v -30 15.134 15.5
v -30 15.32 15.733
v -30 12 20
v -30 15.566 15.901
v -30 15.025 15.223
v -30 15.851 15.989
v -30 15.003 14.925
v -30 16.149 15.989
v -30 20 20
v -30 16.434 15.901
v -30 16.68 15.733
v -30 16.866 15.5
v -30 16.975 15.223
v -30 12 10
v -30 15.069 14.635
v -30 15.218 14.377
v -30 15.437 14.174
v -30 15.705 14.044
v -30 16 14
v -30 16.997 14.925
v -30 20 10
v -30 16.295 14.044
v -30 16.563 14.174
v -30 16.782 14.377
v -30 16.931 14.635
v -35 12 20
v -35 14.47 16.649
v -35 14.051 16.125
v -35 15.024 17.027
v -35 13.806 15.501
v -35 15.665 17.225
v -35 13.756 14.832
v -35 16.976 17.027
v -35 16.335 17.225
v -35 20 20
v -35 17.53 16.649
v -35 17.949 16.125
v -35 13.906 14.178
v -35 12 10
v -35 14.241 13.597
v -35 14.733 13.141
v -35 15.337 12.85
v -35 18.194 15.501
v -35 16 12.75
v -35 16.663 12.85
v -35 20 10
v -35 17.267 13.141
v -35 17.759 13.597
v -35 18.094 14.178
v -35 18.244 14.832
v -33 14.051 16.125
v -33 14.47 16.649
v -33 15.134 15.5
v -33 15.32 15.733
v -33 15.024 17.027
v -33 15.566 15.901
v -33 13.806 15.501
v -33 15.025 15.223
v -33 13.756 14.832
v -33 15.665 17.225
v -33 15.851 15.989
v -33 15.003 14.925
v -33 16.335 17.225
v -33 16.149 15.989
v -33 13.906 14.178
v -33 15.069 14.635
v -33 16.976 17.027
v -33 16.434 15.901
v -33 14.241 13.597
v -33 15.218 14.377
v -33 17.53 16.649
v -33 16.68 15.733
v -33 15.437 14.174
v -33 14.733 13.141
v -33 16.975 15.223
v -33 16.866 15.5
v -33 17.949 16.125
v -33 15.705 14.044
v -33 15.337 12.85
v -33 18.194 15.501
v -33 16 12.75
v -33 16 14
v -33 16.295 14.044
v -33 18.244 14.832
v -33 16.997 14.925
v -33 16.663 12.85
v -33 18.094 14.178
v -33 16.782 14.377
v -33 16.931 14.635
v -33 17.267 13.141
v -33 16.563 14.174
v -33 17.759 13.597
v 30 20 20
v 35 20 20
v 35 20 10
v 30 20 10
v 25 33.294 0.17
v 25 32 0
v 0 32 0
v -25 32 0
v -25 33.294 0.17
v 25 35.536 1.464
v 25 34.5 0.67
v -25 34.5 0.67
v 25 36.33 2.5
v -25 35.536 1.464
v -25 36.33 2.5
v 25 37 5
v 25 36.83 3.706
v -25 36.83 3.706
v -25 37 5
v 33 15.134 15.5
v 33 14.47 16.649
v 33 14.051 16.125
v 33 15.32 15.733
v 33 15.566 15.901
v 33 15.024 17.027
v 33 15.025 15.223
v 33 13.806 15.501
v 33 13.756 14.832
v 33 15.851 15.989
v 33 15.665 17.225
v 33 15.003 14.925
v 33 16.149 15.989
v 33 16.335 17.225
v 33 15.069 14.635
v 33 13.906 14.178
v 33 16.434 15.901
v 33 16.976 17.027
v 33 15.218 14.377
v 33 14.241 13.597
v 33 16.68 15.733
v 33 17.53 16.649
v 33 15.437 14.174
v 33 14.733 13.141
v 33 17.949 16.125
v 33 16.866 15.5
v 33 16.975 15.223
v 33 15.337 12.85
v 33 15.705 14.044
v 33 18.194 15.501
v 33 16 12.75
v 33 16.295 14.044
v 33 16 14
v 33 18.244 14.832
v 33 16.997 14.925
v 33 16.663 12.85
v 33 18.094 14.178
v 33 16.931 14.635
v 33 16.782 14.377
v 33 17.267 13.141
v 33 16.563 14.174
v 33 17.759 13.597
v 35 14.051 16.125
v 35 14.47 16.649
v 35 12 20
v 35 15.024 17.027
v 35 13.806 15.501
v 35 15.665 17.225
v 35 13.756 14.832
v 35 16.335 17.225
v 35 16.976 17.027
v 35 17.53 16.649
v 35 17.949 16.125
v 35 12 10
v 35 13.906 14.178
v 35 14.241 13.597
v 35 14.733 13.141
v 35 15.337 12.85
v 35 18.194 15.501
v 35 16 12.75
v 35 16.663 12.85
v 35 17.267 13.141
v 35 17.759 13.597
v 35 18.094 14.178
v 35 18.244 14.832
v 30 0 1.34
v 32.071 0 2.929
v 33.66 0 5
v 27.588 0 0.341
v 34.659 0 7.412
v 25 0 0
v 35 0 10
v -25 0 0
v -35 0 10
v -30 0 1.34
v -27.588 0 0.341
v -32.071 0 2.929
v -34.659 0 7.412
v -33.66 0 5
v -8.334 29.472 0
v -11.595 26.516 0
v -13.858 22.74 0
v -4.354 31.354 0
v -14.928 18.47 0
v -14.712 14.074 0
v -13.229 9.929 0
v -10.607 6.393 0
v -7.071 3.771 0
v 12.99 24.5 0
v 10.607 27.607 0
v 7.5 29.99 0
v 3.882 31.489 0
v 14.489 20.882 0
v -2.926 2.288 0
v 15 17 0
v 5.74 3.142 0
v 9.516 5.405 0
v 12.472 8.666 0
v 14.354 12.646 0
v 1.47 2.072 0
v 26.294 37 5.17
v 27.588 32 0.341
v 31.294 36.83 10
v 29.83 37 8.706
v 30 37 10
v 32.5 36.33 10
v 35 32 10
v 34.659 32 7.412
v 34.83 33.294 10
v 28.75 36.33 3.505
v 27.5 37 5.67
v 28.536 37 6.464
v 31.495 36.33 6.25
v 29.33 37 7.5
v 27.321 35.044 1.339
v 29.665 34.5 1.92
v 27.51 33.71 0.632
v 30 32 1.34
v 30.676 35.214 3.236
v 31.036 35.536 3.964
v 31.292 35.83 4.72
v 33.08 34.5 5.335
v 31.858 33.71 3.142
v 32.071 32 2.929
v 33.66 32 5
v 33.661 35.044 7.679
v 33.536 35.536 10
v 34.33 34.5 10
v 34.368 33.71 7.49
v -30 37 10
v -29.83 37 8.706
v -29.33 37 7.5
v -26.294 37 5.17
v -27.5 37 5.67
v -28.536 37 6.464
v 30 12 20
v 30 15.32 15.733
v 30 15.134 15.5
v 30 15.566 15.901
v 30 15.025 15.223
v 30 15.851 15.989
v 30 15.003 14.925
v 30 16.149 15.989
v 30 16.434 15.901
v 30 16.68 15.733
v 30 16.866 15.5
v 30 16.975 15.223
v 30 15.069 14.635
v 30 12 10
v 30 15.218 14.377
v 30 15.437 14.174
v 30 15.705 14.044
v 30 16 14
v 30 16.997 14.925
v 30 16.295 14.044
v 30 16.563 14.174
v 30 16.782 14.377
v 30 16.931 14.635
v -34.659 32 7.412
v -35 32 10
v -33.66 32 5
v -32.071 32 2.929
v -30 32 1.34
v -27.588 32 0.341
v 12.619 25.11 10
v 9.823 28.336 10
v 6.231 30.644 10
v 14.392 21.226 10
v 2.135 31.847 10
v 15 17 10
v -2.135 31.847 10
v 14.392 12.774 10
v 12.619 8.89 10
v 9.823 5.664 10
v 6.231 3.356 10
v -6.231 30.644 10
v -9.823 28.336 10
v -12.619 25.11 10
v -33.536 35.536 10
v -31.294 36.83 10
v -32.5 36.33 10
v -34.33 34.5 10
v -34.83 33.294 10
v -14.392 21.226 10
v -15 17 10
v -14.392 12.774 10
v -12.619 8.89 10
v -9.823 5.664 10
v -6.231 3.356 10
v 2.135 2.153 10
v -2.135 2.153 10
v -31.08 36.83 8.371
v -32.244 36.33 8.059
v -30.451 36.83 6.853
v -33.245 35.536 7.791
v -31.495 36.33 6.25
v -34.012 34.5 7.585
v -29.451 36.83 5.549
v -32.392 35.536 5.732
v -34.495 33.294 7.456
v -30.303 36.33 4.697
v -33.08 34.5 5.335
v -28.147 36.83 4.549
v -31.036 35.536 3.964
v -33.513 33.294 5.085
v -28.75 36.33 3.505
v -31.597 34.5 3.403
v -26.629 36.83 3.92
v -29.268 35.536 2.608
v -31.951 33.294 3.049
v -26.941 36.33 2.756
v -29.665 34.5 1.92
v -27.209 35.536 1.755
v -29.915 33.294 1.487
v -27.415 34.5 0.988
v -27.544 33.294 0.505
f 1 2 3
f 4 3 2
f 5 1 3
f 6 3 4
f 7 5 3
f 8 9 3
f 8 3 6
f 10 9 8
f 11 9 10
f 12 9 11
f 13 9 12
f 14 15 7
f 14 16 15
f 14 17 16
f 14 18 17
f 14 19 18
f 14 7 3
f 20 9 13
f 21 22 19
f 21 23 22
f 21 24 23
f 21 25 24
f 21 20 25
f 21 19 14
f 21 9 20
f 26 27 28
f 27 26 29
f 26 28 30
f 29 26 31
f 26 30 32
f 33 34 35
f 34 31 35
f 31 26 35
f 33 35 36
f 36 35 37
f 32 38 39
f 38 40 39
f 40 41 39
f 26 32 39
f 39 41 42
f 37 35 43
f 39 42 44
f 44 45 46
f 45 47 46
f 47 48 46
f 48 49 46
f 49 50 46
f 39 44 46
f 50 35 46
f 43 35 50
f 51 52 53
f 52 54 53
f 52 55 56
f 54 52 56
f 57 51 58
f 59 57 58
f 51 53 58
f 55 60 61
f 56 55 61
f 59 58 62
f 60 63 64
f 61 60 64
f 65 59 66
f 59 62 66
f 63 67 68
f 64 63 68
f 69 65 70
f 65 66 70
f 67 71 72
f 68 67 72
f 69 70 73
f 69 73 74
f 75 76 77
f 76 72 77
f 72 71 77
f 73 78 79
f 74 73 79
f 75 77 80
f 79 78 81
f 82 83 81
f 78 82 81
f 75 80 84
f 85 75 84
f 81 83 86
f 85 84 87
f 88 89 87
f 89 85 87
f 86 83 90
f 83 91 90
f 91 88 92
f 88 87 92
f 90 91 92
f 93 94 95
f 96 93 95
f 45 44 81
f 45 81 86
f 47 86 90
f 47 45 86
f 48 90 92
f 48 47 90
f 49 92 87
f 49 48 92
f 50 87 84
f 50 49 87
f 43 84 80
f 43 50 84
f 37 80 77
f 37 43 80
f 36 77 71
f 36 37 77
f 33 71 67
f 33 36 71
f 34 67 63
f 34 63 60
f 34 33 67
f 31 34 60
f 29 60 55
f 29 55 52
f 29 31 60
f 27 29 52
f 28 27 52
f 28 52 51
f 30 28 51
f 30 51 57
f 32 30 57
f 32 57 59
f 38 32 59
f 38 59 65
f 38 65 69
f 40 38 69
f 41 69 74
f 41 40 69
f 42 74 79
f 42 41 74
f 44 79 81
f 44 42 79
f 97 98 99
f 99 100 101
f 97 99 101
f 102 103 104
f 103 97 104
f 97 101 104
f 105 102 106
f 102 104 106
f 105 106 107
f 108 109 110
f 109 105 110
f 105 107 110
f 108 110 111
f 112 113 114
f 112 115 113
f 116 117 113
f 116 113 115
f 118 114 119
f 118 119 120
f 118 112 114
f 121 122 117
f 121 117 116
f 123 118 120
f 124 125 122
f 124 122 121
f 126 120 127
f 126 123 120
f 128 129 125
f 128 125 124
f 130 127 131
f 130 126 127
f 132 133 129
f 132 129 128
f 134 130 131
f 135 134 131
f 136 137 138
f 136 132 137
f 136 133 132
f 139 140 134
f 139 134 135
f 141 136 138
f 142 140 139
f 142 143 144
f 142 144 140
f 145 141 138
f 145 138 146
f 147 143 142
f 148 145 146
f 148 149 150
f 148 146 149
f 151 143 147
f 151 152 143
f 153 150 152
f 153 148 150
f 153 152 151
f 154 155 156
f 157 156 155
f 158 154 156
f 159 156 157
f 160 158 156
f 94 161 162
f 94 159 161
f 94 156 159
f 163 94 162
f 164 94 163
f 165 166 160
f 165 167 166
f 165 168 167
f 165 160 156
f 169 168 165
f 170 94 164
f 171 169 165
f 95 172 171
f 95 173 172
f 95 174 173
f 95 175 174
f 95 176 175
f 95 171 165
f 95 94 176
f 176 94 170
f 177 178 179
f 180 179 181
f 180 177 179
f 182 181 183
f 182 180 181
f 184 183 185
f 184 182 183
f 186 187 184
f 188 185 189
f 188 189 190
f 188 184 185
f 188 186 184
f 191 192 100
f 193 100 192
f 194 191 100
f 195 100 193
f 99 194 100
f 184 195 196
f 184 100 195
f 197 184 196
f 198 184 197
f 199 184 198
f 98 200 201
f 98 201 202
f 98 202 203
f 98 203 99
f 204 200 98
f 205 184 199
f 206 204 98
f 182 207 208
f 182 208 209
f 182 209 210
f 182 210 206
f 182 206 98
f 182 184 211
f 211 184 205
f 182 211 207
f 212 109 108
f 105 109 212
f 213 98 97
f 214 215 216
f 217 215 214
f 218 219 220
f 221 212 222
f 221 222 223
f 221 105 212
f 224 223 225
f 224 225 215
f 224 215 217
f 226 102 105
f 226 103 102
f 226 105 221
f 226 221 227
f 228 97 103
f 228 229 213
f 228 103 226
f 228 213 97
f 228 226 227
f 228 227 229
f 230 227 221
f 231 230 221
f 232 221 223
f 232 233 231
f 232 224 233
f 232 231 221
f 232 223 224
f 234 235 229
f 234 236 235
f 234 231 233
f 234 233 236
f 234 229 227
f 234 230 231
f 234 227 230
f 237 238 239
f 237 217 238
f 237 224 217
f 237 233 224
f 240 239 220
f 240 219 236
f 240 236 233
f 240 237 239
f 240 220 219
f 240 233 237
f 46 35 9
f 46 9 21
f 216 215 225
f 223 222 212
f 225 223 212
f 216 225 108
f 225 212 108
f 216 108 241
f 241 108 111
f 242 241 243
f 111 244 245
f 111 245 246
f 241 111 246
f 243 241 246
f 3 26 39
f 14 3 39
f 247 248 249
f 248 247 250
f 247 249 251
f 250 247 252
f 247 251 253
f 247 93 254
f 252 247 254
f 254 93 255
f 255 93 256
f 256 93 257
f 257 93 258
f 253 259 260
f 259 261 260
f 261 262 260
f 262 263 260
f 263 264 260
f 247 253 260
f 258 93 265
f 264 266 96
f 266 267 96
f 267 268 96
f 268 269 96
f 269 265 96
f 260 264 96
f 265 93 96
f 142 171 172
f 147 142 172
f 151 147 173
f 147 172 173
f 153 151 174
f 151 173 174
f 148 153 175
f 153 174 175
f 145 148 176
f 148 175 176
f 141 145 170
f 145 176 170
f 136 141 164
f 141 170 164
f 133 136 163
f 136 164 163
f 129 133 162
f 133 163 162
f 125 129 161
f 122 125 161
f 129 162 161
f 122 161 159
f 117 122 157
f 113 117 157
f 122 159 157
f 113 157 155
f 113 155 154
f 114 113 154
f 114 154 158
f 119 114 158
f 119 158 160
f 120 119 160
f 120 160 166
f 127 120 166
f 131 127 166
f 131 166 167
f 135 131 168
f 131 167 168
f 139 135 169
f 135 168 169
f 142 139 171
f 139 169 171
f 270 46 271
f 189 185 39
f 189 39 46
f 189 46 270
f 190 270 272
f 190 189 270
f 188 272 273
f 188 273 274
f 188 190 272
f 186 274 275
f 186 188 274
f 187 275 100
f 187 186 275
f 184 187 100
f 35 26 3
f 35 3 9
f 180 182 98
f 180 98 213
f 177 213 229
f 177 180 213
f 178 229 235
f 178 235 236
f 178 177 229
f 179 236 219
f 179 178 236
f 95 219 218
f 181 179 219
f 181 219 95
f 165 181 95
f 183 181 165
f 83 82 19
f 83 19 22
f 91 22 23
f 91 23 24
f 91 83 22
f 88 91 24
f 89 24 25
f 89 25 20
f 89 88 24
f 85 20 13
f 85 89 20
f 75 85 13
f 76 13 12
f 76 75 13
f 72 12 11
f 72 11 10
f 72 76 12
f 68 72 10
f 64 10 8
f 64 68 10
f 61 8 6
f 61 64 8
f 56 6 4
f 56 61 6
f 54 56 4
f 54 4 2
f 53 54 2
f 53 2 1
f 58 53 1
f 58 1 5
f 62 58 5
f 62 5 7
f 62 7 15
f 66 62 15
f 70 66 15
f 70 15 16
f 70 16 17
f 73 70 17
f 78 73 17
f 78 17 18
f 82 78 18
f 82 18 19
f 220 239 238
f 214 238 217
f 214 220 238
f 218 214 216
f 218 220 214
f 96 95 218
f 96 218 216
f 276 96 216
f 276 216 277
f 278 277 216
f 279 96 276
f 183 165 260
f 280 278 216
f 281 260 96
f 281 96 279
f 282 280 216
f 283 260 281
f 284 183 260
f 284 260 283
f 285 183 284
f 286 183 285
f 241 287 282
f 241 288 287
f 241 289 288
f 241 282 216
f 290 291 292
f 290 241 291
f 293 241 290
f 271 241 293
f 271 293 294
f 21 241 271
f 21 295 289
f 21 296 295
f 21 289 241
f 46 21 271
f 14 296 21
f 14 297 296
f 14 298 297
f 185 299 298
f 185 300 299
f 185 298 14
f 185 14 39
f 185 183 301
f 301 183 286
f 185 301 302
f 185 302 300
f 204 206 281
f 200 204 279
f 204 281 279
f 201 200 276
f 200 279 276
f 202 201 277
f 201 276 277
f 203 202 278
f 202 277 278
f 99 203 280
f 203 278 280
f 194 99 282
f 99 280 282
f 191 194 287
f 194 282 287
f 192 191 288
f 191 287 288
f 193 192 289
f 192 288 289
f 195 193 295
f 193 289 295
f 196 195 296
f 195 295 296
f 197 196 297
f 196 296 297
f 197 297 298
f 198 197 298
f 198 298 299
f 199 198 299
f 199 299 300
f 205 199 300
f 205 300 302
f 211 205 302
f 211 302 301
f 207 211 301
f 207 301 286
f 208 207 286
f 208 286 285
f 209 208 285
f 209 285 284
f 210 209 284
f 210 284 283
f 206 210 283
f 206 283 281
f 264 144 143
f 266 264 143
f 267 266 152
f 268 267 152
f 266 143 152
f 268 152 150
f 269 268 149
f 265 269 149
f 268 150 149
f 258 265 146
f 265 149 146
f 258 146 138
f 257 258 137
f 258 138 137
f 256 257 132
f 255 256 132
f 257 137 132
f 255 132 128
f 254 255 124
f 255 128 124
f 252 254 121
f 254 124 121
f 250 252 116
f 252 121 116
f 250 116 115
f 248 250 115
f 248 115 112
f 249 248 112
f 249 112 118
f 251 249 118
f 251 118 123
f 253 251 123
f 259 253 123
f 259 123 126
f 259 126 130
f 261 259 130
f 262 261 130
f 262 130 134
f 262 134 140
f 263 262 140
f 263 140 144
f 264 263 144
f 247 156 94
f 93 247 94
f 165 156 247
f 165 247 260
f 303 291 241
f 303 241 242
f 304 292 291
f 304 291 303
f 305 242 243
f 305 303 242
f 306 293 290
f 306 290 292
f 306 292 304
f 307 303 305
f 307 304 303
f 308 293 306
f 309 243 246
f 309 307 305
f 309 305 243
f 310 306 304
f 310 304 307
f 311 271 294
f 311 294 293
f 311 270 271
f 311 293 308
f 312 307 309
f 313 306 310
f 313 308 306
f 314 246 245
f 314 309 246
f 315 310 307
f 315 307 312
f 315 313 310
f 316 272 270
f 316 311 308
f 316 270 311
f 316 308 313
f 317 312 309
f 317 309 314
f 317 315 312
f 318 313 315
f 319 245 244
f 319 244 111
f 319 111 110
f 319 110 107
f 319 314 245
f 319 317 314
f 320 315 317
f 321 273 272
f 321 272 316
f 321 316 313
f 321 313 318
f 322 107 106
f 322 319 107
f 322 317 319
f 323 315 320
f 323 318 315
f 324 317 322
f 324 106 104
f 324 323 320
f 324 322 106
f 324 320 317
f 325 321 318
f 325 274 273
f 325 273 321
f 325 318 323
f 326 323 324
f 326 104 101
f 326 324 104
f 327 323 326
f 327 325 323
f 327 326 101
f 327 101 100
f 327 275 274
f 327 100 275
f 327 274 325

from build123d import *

# Parameters (mm, degrees)
BOSS_EXTRUDE1_DEPTH = 37
CUT_EXTRUDE1_REACH  = 53.904
FILLET1_R           = 5
CUT_EXTRUDE2_REACH  = 53.904
SKETCH4_R           = 15
SKETCH5_W           = 10
SKETCH5_H           = 8
SKETCH5_R           = 2.25
SKETCH5_R_2         = 1
BOSS_EXTRUDE2_DEPTH = 5
SKETCH5_3_R         = 2.25
SKETCH5_3_R_2       = 1
CUT_EXTRUDE3_DEPTH  = 2


with BuildPart() as part:
    # Sketch1 → Boss-Extrude1 (new body)
    with BuildSketch(Plane(origin=(0, 0, 0), x_dir=(1, 0, 0), z_dir=(0, 1, 0))):
        with BuildLine():
            Line((-25, 0), (25, 0))
            ThreePointArc((25, 0), (32.071067812, -2.928932188), (35, -10))
            Line((35, -10), (-35, -10))
            ThreePointArc((-35, -10), (-32.071067812, -2.928932188), (-25, 0))
        make_face()
    extrude(amount=BOSS_EXTRUDE1_DEPTH)

    # Sketch3 → Cut-Extrude1 (cut, up to next)
    with BuildSketch(Plane.XY.offset(10), mode=Mode.PRIVATE) as cut_extrude1_sk1:
        with BuildLine():
            Line((-30, 37), (-35, 37))
            Line((-35, 37), (-35, 32))
            ThreePointArc((-35, 32), (-33.535533906, 35.535533906), (-30, 37))
        make_face()
    cut_extrude1_tool1 = extrude(cut_extrude1_sk1.sketch, amount=-CUT_EXTRUDE1_REACH, mode=Mode.PRIVATE) & part.part
    # Sketch3 → Cut-Extrude1 (cut, up to next)
    with BuildSketch(Plane.XY.offset(10), mode=Mode.PRIVATE) as cut_extrude1_sk2:
        with BuildLine():
            Line((30, 37), (35, 37))
            Line((35, 37), (35, 32))
            ThreePointArc((35, 32), (33.535533906, 35.535533906), (30, 37))
        make_face()
    cut_extrude1_tool2 = extrude(cut_extrude1_sk2.sketch, amount=-CUT_EXTRUDE1_REACH, mode=Mode.PRIVATE) & part.part
    add(cut_extrude1_tool1.solids().sort_by_distance((-33.88316, 35.88316, 10))[0], mode=Mode.SUBTRACT)
    add(cut_extrude1_tool2.solids().sort_by_distance((33.88316, 35.88316, 10))[0], mode=Mode.SUBTRACT)

    # Fillet1
    # the kernel refuses this fillet: 5 mm, written as the material it takes off along each edge
    with BuildSketch(Plane(origin=(25, 37, 10), x_dir=(0, 0, -1), z_dir=(-1, 0, 0))) as fillet1_piece_1:
        with BuildLine():
            CenterArc((10 - FILLET1_R, FILLET1_R), FILLET1_R, 270, 90)
            Line((10 - FILLET1_R, 0), (10, 0))
            Line((10, 0), (10, FILLET1_R))
        make_face()
    revolve(axis=Axis((25, 37, 10), (0, -1, 0)), revolution_arc=101.622920284, mode=Mode.SUBTRACT)
    with BuildSketch(Plane(origin=(-25, 37, 10), x_dir=(-0.9794947331304567, 0, 0.20146976887288942), z_dir=(0.20146976887288942, 0, 0.9794947331304567))) as fillet1_piece_2:
        with BuildLine():
            CenterArc((10 - FILLET1_R, FILLET1_R), FILLET1_R, 270, 90)
            Line((10, FILLET1_R), (10, 0))
            Line((10, 0), (10 - FILLET1_R, 0))
        make_face()
    revolve(axis=Axis((-25, 37, 10), (0, -1, 0)), revolution_arc=101.622920284, mode=Mode.SUBTRACT)
    with BuildSketch(Plane(origin=(-25, 37, 0), x_dir=(0, 0, 1), z_dir=(1, 0, 0))) as fillet1_piece_3:
        with BuildLine():
            CenterArc((FILLET1_R, FILLET1_R), FILLET1_R, 180, 90)
            Line((0, FILLET1_R), (0, 0))
            Line((0, 0), (FILLET1_R, 0))
        make_face()
    extrude(amount=50, mode=Mode.SUBTRACT)

    # Sketch4 → Cut-Extrude2 (cut, up to next)
    with BuildSketch(Plane.XY.offset(10), mode=Mode.PRIVATE) as cut_extrude2_sk1:
        with Locations((0, 17)):
            Circle(SKETCH4_R)
    cut_extrude2_tool1 = extrude(cut_extrude2_sk1.sketch, amount=-CUT_EXTRUDE2_REACH, mode=Mode.PRIVATE) & part.part
    add(cut_extrude2_tool1.solids().sort_by_distance((0, 17, 10))[0], mode=Mode.SUBTRACT)

    # Sketch5 → Boss-Extrude2 (add)
    # profile 1 of 2: a face of its own
    with BuildSketch(Plane(origin=(-35, 0, 0), x_dir=(0, 0, -1), z_dir=(1, 0, 0))):
        with Locations((-15, 16)):
            Rectangle(SKETCH5_W, SKETCH5_H)
        with Locations((-15, 16)):
            Circle(SKETCH5_R, mode=Mode.SUBTRACT)
    # profile 2 of 2: a face of its own
    with BuildSketch(Plane(origin=(-35, 0, 0), x_dir=(0, 0, -1), z_dir=(1, 0, 0))):
        with Locations((-15, 16)):
            Circle(SKETCH5_R)
        with Locations((-15, 16)):
            Circle(SKETCH5_R_2, mode=Mode.SUBTRACT)
    boss_extrude2 = extrude(amount=BOSS_EXTRUDE2_DEPTH)

    # Sketch5<3> → Cut-Extrude3 (cut)
    with BuildSketch(Plane(origin=(-35, 0, 0), x_dir=(0, 0, -1), z_dir=(1, 0, 0))):
        with Locations((-15, 16)):
            Circle(SKETCH5_3_R)
        with Locations((-15, 16)):
            Circle(SKETCH5_3_R_2, mode=Mode.SUBTRACT)
    cut_extrude3 = extrude(amount=CUT_EXTRUDE3_DEPTH, mode=Mode.SUBTRACT)

    # Mirror1: Boss-Extrude2, Cut-Extrude3 across plane
    add(boss_extrude2.mirror(Plane(origin=(0, 0, 0), x_dir=(0, 0, 1), z_dir=(1, 0, 0))))
    add(cut_extrude3.mirror(Plane(origin=(0, 0, 0), x_dir=(0, 0, 1), z_dir=(1, 0, 0))), mode=Mode.SUBTRACT)


solid = part.part
